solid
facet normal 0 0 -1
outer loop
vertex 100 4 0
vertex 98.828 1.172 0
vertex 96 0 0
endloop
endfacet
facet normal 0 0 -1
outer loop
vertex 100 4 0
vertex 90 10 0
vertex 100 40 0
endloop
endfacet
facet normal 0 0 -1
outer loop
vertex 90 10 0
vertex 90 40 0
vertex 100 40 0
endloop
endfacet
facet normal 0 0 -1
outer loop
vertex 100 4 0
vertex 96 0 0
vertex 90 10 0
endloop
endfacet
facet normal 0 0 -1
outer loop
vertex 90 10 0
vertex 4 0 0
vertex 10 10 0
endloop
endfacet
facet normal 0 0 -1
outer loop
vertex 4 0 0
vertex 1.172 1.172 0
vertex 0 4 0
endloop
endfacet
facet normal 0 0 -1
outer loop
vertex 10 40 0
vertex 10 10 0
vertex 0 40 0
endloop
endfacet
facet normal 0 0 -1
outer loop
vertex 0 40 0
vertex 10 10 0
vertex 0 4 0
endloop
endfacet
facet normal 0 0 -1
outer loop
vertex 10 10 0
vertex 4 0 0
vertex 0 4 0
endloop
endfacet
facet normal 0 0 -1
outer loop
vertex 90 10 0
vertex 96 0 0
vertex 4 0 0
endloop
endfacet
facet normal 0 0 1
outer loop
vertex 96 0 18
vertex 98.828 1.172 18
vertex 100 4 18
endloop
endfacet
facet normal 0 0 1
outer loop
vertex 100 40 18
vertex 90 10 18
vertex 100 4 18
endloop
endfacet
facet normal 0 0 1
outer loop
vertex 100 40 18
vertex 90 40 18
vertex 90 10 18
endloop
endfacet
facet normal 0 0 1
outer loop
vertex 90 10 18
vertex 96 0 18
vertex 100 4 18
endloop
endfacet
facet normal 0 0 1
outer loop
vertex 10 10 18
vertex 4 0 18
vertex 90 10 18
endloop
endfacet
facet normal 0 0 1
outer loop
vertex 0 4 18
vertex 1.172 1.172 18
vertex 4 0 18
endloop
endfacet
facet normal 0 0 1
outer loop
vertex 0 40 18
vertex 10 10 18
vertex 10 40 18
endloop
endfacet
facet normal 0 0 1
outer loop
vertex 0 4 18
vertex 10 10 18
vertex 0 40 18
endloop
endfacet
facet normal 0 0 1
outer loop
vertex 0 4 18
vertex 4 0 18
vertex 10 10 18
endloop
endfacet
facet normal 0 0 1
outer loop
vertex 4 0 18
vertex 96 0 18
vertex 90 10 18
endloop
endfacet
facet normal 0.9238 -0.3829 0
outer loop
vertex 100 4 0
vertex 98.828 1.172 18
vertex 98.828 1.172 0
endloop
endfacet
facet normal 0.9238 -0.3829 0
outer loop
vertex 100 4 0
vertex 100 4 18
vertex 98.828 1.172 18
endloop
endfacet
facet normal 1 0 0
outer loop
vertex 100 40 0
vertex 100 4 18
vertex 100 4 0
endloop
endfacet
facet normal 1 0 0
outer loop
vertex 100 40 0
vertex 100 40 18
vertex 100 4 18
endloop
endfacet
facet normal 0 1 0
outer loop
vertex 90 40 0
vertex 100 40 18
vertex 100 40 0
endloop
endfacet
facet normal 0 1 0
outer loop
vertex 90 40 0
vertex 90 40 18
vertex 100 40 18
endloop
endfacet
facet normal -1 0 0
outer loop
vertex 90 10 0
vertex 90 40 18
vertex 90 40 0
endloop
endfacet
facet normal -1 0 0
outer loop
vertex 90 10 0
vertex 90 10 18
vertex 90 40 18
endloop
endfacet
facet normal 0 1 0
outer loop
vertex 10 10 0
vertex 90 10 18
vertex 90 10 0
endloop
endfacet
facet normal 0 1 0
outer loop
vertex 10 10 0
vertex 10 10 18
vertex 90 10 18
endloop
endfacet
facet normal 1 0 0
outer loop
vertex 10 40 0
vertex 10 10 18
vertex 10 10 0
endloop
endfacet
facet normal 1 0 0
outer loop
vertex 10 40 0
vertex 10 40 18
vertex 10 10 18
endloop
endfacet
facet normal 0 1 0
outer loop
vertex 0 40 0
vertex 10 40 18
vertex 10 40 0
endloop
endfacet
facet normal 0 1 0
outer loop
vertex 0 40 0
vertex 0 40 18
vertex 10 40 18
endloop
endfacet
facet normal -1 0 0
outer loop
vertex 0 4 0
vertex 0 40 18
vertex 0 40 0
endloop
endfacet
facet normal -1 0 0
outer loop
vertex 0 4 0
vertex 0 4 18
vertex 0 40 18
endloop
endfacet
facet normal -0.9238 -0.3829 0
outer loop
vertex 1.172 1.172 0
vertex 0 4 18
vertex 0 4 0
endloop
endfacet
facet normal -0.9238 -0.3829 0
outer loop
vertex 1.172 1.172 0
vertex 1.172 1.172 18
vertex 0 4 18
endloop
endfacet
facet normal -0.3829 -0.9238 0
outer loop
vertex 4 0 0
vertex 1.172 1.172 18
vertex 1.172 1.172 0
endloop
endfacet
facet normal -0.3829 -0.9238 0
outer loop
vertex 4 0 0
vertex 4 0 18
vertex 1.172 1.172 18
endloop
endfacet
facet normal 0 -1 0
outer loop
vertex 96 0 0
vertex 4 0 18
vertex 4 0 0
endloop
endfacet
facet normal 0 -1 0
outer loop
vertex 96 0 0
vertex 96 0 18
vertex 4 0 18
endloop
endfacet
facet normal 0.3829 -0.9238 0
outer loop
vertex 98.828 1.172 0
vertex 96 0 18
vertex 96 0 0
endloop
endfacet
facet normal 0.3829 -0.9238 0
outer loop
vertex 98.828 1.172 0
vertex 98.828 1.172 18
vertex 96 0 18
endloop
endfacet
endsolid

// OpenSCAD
$fn = 32;

// ----------------------------------------------------------------------
// Heat sink frame: 100 x 40 mm frame, 10 mm walls
// ----------------------------------------------------------------------

// --- parameters (mm) ---
profile_height = 18;      // extrusion height
profile_points = 12;      // points of the closed outline

profile = [[0, 4], [1.172, 1.172], [4, 0], [96, 0], [98.828, 1.172], [100, 4], [100, 40], [90, 40], [90, 10], [10, 10], [10, 40], [0, 40]];  // single closed polygon, 12 points, counter clockwise

// --- the one profile operation ---
linear_extrude(height = profile_height) polygon(points = profile);
